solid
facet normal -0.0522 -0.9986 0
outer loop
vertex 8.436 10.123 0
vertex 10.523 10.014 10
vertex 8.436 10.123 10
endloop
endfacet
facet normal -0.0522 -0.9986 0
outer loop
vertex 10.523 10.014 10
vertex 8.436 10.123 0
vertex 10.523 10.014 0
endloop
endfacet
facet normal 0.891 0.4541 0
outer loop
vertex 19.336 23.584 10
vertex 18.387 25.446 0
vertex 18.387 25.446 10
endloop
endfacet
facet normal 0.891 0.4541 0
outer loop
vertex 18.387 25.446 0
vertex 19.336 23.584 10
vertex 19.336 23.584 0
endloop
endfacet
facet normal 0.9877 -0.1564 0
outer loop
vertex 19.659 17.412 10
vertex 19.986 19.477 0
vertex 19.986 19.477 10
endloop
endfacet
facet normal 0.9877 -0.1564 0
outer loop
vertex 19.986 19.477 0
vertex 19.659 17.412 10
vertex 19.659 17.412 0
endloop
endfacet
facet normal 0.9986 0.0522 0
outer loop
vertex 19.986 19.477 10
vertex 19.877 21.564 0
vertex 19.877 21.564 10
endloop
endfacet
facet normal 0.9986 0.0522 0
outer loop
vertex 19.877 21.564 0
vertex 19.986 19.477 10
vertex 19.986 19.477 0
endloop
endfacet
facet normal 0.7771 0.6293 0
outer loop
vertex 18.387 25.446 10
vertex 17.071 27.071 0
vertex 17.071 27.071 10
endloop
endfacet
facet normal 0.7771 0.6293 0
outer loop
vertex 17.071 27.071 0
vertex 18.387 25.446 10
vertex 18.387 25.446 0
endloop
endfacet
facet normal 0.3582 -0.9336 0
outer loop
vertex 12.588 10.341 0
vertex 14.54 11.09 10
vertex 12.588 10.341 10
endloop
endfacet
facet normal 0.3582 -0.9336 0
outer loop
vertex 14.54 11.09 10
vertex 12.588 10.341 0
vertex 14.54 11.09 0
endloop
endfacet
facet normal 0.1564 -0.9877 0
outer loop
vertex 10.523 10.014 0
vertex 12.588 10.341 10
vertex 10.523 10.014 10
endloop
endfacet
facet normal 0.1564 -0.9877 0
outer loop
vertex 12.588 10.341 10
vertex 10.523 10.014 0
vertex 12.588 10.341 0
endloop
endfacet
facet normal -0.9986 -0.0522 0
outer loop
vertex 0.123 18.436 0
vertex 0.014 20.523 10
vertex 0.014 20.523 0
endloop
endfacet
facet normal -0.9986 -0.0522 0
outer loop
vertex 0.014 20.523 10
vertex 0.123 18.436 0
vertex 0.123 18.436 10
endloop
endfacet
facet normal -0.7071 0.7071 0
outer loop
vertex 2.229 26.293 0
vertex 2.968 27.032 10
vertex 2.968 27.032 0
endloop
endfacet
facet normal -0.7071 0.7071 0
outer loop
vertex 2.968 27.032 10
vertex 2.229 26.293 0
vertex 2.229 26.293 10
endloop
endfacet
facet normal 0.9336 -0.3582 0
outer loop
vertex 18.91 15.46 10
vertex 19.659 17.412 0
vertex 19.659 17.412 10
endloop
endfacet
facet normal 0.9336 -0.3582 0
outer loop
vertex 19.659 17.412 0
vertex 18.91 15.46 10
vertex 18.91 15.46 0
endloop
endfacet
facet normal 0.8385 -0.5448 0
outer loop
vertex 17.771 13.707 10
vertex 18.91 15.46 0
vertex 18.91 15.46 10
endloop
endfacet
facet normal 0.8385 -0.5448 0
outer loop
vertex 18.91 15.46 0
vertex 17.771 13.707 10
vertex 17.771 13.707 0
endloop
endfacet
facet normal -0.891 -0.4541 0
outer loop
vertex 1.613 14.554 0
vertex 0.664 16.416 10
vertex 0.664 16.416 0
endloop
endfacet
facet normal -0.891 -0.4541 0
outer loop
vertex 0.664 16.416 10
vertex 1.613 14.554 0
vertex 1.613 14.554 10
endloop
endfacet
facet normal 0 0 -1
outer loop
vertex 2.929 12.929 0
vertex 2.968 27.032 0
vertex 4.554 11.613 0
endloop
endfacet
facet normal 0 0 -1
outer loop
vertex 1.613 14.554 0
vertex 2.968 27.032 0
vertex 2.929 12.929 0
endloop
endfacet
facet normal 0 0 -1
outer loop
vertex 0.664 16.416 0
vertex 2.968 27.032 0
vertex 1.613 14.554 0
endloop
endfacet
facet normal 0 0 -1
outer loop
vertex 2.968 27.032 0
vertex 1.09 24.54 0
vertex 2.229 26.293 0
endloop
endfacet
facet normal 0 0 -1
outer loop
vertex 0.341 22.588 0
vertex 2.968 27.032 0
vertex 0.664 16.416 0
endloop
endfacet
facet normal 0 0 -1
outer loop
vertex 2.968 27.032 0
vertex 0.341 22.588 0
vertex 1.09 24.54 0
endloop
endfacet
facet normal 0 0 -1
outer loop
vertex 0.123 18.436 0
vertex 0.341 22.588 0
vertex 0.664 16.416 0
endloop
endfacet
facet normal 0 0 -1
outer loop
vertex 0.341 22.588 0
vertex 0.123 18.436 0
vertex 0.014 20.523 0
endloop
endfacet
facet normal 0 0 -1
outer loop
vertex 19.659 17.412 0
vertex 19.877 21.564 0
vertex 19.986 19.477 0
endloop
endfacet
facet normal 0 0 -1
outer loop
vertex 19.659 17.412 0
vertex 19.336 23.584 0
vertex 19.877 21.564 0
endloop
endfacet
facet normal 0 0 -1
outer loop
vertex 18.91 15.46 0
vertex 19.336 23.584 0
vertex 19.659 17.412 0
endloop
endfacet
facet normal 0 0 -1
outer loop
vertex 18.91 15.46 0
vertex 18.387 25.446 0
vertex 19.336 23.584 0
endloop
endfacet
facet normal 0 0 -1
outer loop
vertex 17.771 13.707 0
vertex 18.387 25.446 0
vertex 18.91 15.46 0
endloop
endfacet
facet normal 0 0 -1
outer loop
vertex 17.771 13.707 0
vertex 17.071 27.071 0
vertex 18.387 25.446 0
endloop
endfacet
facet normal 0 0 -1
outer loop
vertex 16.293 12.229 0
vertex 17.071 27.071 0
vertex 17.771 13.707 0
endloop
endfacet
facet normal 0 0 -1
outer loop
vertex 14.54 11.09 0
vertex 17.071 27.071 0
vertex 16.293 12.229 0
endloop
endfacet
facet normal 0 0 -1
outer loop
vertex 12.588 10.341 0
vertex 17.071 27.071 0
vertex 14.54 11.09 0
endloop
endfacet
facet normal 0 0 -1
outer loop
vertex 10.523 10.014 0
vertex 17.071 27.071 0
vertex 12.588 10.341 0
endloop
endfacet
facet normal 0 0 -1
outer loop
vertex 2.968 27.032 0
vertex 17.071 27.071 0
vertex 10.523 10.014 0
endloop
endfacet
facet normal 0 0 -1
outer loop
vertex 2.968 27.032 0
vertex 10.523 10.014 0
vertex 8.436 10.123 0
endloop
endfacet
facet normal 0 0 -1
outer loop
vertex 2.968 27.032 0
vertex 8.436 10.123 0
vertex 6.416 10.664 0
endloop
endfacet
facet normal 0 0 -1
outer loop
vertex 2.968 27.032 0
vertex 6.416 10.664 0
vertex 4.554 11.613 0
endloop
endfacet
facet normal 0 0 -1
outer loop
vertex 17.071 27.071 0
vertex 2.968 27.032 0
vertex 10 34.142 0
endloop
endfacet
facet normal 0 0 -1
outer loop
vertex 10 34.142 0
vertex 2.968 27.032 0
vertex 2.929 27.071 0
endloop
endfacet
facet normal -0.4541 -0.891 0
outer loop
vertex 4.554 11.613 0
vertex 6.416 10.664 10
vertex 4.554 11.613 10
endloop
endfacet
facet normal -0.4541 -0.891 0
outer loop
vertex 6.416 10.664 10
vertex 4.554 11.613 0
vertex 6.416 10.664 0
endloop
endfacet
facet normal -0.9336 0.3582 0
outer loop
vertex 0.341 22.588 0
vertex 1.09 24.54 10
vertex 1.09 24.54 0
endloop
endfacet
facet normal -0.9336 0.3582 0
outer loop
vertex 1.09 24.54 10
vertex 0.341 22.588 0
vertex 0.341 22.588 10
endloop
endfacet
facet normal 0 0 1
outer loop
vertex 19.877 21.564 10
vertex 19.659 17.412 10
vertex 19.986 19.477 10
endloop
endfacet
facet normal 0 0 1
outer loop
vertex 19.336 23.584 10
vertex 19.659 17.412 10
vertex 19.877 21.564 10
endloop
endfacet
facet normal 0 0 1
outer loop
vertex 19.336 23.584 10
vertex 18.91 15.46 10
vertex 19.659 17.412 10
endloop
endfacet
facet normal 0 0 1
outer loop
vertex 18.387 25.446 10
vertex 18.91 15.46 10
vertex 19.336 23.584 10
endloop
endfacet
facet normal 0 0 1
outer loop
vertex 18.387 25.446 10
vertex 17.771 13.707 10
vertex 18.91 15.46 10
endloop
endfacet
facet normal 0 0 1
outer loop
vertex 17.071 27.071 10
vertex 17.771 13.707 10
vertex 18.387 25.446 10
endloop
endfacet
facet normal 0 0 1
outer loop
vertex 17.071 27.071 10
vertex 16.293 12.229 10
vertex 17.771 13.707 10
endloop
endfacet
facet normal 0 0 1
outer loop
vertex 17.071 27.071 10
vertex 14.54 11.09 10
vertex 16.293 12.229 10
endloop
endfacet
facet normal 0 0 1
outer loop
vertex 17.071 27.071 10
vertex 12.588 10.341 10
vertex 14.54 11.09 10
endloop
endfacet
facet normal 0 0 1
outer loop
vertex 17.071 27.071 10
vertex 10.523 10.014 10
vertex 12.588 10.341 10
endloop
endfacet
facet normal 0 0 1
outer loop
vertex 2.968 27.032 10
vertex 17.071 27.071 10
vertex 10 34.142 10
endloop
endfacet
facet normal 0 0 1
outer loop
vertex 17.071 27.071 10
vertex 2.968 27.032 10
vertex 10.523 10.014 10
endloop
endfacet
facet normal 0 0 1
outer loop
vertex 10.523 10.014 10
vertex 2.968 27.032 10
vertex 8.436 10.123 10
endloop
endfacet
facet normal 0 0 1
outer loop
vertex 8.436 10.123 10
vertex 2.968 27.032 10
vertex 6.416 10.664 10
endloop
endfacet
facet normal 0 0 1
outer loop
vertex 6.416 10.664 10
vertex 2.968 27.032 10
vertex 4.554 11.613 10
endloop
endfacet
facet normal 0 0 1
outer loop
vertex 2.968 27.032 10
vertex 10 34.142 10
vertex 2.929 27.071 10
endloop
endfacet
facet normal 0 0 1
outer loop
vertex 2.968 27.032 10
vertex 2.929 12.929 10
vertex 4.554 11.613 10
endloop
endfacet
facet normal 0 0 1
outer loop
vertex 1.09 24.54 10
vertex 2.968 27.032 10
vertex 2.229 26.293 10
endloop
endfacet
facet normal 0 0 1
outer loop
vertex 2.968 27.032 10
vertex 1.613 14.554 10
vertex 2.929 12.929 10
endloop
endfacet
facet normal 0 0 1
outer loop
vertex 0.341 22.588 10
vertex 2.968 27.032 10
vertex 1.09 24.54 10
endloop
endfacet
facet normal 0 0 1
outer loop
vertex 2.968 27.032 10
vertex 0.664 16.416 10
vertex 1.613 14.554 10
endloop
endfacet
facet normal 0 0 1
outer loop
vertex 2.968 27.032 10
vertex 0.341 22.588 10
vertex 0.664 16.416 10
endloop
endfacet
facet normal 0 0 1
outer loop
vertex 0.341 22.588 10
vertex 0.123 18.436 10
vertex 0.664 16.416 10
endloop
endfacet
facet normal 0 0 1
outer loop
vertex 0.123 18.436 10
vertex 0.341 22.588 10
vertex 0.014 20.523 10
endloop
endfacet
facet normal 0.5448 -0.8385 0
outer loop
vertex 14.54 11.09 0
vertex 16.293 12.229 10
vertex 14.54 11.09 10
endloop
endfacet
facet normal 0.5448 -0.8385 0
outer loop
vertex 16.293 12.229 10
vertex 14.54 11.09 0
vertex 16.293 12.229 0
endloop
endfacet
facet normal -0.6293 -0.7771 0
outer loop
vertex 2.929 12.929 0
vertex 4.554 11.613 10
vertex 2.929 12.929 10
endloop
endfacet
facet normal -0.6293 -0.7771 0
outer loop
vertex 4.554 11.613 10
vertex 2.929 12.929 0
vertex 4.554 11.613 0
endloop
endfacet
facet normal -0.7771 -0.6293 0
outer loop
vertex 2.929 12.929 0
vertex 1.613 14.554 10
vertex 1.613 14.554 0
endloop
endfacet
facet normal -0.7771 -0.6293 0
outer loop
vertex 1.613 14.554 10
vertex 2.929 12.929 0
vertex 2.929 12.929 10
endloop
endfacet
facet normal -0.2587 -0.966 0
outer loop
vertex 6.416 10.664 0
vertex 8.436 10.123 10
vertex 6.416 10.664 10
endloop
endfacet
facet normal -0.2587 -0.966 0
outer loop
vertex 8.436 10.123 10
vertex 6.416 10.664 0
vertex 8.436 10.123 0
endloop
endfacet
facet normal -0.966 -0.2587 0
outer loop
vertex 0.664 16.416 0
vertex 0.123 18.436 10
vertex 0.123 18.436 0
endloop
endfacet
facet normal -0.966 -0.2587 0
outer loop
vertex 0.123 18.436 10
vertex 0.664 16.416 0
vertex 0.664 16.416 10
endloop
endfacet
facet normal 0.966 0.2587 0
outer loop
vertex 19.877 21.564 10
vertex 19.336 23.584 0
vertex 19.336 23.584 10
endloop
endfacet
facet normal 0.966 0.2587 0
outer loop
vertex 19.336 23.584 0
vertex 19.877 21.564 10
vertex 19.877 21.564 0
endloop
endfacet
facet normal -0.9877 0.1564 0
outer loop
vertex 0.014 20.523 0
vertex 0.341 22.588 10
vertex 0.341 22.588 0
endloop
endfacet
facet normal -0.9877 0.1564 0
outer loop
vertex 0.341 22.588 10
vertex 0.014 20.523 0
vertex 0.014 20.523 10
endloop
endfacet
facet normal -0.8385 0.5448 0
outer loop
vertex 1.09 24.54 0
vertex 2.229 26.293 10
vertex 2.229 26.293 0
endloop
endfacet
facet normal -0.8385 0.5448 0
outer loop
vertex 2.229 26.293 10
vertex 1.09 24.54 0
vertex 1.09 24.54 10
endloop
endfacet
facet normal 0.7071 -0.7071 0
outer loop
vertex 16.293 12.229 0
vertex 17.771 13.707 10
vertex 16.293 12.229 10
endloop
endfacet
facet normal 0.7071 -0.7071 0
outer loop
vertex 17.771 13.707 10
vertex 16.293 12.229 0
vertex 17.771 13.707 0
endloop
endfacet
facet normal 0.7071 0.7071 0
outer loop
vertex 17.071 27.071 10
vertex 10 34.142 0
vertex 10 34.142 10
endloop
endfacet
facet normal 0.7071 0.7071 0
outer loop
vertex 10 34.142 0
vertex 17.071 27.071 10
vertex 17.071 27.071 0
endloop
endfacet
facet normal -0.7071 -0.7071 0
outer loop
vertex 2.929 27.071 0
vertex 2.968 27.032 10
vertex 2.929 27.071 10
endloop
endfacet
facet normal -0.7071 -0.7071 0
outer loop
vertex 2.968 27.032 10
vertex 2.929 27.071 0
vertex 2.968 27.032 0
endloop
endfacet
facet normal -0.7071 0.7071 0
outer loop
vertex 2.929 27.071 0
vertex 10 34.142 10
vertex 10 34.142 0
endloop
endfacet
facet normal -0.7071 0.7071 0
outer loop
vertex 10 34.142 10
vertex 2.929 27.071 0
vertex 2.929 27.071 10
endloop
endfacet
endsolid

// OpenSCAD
angle=45;
multmatrix(m = [ [cos(angle), -sin(angle), 0, 10],
                [sin(angle), cos(angle), 0, 20],
                [0, 0, 1, 0],
                [0, 0, 0,  1]
              ]) union() {
   cylinder(r=10.0,h=10,center=false);
   cube(size=[10,10,10],center=false);
}
